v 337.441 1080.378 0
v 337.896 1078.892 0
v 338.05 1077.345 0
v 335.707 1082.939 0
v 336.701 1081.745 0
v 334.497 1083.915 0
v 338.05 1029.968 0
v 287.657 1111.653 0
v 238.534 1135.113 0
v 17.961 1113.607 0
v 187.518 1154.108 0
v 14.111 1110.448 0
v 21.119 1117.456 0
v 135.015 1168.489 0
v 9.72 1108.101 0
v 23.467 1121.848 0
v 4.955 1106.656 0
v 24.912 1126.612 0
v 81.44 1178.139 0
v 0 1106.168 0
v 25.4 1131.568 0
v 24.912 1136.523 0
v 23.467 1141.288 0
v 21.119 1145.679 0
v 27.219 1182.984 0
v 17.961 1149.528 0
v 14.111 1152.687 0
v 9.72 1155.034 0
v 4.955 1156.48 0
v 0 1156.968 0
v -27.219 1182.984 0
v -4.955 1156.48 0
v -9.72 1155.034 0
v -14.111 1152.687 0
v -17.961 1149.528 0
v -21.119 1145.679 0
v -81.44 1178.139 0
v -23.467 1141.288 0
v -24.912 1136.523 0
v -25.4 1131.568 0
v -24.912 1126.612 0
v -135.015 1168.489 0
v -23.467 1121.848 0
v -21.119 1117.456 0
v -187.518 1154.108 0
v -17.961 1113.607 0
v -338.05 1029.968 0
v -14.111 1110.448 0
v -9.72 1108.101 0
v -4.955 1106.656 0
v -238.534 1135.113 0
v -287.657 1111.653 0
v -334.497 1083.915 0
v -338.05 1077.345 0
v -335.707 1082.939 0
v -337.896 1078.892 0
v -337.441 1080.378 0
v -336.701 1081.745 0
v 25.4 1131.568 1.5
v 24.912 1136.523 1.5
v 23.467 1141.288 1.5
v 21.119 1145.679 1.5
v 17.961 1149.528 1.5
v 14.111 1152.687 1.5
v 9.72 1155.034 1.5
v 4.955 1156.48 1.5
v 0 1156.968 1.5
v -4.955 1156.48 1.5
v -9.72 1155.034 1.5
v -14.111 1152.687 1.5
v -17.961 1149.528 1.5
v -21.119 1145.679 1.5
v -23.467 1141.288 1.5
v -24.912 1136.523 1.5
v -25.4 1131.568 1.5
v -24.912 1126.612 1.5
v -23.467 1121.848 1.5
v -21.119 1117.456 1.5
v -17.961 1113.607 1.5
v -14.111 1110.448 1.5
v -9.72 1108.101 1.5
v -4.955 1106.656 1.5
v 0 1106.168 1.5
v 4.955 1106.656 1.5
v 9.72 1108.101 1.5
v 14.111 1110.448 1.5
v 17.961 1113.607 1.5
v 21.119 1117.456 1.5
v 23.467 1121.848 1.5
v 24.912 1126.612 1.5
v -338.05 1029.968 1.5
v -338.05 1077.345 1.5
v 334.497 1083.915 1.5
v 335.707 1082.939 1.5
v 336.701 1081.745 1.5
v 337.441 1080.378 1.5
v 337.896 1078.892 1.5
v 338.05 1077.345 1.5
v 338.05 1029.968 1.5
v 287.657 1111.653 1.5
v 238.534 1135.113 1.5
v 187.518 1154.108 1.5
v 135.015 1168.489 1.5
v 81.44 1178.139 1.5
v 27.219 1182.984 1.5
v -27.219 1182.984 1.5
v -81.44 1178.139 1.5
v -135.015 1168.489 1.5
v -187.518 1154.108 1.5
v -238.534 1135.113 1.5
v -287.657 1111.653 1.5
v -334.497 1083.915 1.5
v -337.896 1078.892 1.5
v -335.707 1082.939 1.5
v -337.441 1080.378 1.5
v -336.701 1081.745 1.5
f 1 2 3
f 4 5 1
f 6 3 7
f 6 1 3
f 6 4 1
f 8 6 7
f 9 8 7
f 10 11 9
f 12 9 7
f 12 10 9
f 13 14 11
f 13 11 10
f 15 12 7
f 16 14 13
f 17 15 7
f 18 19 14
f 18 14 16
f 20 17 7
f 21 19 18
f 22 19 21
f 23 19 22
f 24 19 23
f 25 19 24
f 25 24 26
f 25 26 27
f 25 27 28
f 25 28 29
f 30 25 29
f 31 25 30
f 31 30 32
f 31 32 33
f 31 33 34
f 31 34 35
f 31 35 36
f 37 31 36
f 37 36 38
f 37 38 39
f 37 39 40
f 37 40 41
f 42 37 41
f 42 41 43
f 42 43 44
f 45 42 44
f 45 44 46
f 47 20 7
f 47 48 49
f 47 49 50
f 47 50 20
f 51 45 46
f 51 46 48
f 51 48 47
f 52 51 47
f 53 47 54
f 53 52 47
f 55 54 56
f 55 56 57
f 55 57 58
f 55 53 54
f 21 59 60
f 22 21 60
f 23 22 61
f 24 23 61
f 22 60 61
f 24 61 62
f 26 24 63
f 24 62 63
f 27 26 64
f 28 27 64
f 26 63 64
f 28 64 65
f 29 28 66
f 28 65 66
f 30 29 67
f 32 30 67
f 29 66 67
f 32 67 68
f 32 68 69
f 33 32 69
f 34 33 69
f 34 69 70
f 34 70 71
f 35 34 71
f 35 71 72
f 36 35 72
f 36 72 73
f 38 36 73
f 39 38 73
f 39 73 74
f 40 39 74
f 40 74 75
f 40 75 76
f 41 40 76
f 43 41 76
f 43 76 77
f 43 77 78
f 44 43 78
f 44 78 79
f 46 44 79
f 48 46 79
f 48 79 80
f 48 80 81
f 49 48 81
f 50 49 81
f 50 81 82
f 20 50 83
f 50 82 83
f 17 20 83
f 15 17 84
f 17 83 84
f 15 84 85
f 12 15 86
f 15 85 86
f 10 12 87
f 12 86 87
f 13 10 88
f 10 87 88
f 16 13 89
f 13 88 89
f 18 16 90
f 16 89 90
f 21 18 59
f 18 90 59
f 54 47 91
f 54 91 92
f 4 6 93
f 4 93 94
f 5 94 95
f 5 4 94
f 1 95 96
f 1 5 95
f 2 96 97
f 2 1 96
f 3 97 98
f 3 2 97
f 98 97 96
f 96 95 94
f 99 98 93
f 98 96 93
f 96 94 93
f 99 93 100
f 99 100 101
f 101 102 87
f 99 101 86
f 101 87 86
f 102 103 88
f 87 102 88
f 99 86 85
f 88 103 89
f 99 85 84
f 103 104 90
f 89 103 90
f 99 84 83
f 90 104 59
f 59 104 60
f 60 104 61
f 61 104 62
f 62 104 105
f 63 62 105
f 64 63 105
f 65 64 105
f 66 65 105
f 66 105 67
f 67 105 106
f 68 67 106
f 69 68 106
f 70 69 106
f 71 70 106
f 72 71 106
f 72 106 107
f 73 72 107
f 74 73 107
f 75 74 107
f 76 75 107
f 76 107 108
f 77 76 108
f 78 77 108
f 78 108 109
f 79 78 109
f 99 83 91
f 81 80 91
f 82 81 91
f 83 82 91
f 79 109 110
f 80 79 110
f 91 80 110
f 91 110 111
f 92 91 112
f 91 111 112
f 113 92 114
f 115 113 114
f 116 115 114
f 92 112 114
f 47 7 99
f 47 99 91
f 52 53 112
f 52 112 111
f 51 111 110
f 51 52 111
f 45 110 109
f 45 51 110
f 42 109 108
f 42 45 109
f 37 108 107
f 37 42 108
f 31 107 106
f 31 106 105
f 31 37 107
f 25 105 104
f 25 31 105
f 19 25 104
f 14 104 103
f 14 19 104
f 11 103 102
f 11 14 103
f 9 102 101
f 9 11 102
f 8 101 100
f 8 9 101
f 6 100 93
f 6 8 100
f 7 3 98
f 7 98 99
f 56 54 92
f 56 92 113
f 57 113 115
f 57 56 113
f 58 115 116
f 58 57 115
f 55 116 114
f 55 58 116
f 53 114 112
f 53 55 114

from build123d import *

# Parameters (mm, degrees)
EXTRUDE1_DEPTH     = 1.5
SKETCH2_R          = 25.4
CUT_EXTRUDE1_DEPTH = 2.5


with BuildPart() as part:
    # Sketch1 → Extrude1 (new body)
    with BuildSketch(Plane.XY):
        with BuildLine():
            Line((-338.05, 1029.967766013), (-338.05, 1077.344981378))
            ThreePointArc((-338.05, 1077.344981378), (-337.104806678, 1081.079435118), (-334.496842105, 1083.914581664))
            ThreePointArc((-334.496842105, 1083.914581664), (0, 1183.590029436), (334.496842105, 1083.914581664))
            ThreePointArc((334.496842105, 1083.914581664), (337.104806678, 1081.079435118), (338.05, 1077.344981378))
            Line((338.05, 1077.344981378), (338.05, 1029.967766013))
            Line((338.05, 1029.967766013), (-338.05, 1029.967766013))
        make_face()
    extrude(amount=EXTRUDE1_DEPTH)

    # Sketch2 → Cut-Extrude1 (cut, through all)
    with BuildSketch(Plane.XY.offset(1.5)):
        with Locations((0, 1131.567766013)):
            Circle(SKETCH2_R)
    extrude(amount=-CUT_EXTRUDE1_DEPTH, mode=Mode.SUBTRACT)


solid = part.part
